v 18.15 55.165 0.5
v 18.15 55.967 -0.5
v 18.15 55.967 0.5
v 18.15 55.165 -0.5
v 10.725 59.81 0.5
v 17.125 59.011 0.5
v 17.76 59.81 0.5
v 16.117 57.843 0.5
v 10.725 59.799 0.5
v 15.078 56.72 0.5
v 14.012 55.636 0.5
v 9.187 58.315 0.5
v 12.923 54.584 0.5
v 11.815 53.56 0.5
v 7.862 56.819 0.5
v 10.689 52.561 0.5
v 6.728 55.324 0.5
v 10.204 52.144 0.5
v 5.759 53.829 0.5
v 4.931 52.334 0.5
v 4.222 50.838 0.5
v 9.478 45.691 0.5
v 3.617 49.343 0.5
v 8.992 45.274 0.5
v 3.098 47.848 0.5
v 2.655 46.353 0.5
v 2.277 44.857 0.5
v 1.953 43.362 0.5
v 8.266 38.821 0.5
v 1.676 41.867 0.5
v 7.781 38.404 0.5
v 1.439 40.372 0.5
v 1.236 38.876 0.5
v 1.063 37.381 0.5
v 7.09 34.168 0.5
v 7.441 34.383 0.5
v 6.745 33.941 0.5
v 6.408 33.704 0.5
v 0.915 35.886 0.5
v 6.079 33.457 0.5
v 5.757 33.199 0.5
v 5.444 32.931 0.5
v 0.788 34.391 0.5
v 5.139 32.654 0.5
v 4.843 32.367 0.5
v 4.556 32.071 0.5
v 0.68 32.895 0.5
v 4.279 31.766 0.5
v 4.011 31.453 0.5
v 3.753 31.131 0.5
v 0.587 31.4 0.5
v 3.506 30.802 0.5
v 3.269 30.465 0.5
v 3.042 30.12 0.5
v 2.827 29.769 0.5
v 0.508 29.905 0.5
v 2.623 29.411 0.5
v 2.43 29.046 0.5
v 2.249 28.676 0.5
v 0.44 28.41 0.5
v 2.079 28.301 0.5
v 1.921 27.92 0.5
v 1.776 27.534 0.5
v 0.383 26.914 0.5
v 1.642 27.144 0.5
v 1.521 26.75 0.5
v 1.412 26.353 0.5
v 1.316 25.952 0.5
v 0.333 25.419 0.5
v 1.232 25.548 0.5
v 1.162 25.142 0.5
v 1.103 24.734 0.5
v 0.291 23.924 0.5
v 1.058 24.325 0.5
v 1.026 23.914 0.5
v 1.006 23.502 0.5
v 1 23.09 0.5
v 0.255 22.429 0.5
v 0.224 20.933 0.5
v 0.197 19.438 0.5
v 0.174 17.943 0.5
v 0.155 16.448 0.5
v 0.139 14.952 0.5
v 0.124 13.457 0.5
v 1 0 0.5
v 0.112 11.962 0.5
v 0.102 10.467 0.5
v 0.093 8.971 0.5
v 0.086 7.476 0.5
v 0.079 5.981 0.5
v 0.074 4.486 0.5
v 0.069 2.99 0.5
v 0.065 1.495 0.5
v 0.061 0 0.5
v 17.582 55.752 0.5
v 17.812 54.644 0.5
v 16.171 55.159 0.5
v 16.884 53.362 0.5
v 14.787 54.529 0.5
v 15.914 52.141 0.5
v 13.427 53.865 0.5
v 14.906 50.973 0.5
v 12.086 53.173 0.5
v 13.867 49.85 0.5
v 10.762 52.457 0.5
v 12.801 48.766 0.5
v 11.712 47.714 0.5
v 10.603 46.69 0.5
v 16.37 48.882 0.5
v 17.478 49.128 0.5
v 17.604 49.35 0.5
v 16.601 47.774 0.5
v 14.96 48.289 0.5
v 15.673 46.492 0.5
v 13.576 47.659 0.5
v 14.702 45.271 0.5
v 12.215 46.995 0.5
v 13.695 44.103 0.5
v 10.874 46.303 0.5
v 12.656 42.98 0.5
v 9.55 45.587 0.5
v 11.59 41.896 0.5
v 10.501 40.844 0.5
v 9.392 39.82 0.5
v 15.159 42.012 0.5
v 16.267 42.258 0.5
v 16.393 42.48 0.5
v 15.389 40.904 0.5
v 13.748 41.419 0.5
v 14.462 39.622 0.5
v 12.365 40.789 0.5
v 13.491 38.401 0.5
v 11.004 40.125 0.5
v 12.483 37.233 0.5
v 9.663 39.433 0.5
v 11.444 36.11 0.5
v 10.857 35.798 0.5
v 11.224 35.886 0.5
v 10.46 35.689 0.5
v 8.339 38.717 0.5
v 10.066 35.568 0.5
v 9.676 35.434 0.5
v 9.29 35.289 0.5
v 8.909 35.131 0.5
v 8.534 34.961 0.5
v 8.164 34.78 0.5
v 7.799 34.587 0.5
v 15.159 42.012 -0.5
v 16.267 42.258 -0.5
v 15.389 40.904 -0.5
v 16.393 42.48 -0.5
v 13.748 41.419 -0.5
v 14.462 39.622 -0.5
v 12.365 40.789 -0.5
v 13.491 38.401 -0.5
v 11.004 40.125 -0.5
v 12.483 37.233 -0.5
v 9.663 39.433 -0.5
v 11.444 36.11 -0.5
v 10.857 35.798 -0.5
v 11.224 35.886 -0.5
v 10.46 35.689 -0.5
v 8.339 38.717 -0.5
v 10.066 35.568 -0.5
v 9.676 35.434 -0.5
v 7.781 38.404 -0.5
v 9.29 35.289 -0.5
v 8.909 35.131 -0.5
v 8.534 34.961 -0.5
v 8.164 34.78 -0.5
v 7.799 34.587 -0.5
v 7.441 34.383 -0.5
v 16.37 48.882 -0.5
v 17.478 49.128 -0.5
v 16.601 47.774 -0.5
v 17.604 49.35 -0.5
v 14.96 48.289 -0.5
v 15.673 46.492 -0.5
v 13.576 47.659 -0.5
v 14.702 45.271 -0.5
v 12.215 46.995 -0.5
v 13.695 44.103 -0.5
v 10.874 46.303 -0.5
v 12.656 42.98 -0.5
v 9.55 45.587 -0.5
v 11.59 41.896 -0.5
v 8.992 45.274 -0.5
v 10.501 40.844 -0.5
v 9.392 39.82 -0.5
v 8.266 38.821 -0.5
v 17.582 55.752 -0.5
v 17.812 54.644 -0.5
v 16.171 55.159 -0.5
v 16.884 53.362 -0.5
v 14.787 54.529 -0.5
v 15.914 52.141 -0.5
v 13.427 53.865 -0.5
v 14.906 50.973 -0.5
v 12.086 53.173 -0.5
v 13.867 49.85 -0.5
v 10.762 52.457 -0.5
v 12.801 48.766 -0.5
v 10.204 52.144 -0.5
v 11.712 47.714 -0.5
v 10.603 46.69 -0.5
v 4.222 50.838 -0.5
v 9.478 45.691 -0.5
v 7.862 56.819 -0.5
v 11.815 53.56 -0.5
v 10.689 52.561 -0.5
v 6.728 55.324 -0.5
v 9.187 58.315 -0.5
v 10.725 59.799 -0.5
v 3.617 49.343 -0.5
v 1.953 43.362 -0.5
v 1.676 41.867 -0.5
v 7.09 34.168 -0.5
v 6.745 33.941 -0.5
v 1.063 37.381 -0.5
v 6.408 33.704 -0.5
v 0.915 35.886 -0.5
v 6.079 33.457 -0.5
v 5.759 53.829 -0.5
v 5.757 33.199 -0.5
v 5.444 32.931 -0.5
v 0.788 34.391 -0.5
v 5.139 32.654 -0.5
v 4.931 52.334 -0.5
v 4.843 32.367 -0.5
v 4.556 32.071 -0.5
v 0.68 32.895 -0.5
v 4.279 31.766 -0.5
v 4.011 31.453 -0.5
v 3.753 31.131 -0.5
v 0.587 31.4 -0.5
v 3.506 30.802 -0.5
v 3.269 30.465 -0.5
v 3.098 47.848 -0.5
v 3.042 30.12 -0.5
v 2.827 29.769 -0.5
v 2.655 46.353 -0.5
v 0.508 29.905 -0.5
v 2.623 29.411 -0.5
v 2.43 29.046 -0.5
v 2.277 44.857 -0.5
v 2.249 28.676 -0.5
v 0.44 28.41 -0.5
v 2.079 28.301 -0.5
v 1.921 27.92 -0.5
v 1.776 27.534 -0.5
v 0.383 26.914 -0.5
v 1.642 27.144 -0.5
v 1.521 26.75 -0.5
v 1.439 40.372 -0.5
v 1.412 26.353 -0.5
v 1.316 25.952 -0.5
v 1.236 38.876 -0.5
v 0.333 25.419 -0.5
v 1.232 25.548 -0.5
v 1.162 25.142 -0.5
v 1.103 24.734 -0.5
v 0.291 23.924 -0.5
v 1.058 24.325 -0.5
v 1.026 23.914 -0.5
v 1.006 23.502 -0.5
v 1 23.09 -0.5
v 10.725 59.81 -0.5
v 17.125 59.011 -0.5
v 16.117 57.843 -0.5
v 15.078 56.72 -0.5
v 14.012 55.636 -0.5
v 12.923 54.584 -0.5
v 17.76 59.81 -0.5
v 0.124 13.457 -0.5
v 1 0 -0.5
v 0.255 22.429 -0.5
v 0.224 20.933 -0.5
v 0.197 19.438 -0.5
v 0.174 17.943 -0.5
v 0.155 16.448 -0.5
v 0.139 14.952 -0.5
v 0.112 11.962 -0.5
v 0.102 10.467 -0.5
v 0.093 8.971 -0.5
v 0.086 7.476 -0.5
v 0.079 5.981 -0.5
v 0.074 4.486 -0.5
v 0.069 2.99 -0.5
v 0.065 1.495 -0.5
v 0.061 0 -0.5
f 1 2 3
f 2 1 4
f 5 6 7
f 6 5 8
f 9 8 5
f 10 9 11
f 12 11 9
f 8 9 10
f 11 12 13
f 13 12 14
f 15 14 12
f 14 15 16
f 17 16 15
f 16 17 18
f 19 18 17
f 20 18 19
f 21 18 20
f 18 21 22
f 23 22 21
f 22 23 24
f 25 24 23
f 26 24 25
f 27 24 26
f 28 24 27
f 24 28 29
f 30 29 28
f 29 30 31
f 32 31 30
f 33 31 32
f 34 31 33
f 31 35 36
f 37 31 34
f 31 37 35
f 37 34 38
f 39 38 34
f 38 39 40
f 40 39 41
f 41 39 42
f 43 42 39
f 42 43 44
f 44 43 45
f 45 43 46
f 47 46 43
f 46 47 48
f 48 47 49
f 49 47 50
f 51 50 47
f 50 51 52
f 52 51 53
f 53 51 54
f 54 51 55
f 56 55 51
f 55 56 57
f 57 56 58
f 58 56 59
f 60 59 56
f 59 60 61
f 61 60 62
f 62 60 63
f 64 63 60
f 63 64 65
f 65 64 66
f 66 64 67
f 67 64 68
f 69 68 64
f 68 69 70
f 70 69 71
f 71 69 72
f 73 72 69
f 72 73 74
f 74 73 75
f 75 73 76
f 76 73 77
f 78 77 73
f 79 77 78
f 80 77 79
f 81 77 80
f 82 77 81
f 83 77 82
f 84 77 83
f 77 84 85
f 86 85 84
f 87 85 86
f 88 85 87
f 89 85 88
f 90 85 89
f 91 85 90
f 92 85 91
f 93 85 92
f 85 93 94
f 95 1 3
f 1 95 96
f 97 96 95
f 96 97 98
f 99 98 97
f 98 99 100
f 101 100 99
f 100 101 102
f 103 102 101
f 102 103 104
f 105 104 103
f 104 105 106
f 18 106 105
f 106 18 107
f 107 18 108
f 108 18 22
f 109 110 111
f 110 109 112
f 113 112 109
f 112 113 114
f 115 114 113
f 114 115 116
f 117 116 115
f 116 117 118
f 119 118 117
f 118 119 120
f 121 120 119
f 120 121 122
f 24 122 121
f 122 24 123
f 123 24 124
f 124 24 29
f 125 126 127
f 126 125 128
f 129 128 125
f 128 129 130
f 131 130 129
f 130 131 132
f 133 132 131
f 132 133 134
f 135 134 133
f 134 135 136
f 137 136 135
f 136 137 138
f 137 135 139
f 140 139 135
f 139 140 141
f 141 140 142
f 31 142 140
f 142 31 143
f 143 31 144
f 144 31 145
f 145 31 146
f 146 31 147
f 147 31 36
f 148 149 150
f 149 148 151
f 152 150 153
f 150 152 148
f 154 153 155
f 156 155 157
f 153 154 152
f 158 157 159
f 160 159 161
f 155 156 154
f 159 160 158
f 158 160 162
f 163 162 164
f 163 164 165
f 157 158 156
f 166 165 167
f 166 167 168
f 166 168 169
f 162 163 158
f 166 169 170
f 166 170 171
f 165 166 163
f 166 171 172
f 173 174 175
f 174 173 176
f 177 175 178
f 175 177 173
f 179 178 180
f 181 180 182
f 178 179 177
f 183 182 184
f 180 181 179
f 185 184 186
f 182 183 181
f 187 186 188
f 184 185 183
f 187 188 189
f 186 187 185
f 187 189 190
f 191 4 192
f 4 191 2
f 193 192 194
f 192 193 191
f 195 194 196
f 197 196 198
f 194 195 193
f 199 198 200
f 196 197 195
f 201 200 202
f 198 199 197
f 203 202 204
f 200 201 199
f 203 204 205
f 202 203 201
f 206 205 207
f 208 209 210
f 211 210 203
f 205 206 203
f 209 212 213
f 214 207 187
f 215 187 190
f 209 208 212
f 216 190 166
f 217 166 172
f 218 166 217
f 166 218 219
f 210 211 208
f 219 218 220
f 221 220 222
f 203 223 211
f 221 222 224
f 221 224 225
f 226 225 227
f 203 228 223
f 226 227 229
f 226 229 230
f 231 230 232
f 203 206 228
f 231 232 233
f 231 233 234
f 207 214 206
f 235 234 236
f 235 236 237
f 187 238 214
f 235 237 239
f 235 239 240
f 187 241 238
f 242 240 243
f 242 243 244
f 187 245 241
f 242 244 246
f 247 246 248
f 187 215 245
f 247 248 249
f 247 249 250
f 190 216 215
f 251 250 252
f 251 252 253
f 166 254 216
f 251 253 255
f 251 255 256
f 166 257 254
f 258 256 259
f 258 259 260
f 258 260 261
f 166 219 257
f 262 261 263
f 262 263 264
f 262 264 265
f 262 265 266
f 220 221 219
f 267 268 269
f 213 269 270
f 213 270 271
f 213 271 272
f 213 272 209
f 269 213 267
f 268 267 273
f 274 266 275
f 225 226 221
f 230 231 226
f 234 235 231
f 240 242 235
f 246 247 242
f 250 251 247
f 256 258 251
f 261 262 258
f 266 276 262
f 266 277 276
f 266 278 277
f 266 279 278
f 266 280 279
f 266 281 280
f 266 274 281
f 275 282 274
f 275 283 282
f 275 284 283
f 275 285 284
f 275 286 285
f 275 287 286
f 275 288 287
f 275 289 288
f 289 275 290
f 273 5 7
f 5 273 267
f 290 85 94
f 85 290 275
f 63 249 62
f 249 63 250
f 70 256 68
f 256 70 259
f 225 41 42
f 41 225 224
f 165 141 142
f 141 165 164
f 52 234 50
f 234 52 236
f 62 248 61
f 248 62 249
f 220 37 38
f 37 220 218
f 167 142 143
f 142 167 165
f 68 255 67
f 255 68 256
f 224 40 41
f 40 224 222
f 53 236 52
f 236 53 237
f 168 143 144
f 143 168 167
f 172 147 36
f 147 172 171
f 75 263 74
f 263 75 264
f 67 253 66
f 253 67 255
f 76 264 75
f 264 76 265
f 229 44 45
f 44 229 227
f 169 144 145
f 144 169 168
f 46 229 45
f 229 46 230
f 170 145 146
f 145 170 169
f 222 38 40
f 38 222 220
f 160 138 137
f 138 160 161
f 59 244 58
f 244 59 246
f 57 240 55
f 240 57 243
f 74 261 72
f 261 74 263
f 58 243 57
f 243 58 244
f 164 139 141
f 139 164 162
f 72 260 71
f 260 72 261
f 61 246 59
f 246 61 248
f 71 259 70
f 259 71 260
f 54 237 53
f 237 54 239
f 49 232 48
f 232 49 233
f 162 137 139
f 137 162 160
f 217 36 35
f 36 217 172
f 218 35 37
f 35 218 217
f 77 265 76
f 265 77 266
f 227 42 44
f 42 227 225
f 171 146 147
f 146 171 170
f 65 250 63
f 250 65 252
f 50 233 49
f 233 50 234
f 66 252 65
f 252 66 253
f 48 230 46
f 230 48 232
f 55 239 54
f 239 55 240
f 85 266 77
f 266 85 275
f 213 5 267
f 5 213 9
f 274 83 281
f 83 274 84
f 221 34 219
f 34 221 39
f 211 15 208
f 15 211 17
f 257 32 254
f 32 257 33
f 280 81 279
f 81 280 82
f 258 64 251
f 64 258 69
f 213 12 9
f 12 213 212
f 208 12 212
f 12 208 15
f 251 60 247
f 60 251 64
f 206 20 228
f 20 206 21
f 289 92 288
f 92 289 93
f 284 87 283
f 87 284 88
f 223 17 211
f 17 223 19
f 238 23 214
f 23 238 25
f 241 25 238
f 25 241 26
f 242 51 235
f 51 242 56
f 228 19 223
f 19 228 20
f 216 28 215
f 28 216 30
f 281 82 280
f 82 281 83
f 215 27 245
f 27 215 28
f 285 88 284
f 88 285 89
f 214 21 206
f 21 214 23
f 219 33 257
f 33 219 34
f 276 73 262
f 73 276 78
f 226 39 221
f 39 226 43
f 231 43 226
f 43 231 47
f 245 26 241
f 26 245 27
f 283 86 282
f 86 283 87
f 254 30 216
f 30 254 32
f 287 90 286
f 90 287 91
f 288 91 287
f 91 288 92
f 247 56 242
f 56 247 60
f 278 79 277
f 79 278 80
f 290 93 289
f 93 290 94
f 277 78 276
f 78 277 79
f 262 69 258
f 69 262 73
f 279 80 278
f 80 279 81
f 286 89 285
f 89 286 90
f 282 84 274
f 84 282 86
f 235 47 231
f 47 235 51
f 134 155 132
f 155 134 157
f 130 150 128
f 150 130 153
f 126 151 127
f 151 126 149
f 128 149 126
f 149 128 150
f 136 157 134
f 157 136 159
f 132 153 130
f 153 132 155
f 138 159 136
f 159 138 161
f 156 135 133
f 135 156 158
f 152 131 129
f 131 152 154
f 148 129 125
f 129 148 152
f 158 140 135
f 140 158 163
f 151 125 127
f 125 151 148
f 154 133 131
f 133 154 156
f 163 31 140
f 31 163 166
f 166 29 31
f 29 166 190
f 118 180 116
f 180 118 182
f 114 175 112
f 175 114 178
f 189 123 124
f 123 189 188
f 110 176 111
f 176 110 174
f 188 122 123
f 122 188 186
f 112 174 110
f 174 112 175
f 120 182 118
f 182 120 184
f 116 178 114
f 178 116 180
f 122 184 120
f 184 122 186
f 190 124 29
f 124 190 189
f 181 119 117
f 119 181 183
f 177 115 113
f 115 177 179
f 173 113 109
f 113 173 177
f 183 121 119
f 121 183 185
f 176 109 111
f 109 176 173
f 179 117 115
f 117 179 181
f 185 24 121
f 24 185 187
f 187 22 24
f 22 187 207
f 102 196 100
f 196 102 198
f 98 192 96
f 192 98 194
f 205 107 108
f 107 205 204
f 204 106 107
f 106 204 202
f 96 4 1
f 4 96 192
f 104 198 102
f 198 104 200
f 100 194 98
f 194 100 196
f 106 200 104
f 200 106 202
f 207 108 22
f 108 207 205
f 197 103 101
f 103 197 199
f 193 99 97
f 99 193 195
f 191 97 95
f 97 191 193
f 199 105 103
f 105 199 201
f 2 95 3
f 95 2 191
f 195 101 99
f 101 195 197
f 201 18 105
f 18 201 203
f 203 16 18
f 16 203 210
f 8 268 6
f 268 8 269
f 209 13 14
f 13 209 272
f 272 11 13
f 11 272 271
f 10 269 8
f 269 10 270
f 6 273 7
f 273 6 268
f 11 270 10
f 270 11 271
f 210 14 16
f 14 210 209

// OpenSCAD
ww = 1;
w1 = 36.3;
w2 = 21.35;
e = 59.81;
r = 13.12;
g = 9.97;
i = 6.87;
f = 5.91;
h = 21.59;
a = 4.03;
d = 23.02;
d0 = w1/2-a-r;

R = 0.105;
c1 = w2/(2*(pow(2.71,R*e)-1));
c2 = w2*pow(2.71,R*e)/(pow(2.71,R*e)-1);

function f(z) = (c1*pow(2.71,R*z)+c2);

perf = [
  [-1,f(0)],
  for (z = [0 : e/40 : e])
    [z,f(z)],
  
  [-1,f(e)]
];
  
module perfil(){
  translate([0,0,-ww])
    union(){
      difference(){
        translate([-w2/2+0.05,-0.05,0])
        cube([w2,e+0.1,2*ww]);
        
        translate([-w2,0,-ww])
        mirror([180,0,0])
        rotate([0,0,90])
        linear_extrude(height = 4*ww) {
          polygon(perf);
        }
      }
    }
}

module lobulo(){
  rotate([0,0,-55])
  translate([0,d-e,0])
  difference(){
    translate([0,2*d,0])
    cube([w2-2*d0,d,ww+0.1],center=true);
    
    union(){
      translate([-w2-d0,0,-ww])
      mirror([180,0,0])
      rotate([0,0,90])
      linear_extrude(height = 2*ww) {
        polygon(perf);
      }
      
      rotate([0,180,0])
      translate([-w2-d0,0,-ww])
      mirror([180,0,0])
      rotate([0,0,90])
      linear_extrude(height = 2*ww) {
        polygon(perf);
      }
    }
  }
}


difference(){
  difference(){
    difference(){
      difference(){
        difference(){
          difference(){
            translate([0,e/2,0])
            cube([w1,e,ww],center=true);
            
            translate([w1/2-a,g+r,0])
            cylinder(r=r,center=true,h=2*ww,$fn=200);
          }
          
          translate([-r+w1/2-a,-0.1,-ww])
          cube([2*r,g+r+0.1,2*ww]);
        }
        
        translate([-r-w1/2+a,-0.1,-ww])
        cube([2*r,e+0.2,2*ww]);
      }
      
      perfil();
    }
  }
  
  union(){
    translate([(f+g+h)*tan(10),g+h,0])
    lobulo();
    translate([(f+g+h+i)*tan(10),g+h+i,0])
    lobulo();
    translate([(f+g+h+2*i)*tan(10),g+h+2*i,0])
    lobulo();
    translate([(f+g+h+3*i)*tan(10),g+h+3*i,0])
    lobulo();
    translate([15,28,-1.5*ww])
    cube([10,10,3*ww]);
  }
}
